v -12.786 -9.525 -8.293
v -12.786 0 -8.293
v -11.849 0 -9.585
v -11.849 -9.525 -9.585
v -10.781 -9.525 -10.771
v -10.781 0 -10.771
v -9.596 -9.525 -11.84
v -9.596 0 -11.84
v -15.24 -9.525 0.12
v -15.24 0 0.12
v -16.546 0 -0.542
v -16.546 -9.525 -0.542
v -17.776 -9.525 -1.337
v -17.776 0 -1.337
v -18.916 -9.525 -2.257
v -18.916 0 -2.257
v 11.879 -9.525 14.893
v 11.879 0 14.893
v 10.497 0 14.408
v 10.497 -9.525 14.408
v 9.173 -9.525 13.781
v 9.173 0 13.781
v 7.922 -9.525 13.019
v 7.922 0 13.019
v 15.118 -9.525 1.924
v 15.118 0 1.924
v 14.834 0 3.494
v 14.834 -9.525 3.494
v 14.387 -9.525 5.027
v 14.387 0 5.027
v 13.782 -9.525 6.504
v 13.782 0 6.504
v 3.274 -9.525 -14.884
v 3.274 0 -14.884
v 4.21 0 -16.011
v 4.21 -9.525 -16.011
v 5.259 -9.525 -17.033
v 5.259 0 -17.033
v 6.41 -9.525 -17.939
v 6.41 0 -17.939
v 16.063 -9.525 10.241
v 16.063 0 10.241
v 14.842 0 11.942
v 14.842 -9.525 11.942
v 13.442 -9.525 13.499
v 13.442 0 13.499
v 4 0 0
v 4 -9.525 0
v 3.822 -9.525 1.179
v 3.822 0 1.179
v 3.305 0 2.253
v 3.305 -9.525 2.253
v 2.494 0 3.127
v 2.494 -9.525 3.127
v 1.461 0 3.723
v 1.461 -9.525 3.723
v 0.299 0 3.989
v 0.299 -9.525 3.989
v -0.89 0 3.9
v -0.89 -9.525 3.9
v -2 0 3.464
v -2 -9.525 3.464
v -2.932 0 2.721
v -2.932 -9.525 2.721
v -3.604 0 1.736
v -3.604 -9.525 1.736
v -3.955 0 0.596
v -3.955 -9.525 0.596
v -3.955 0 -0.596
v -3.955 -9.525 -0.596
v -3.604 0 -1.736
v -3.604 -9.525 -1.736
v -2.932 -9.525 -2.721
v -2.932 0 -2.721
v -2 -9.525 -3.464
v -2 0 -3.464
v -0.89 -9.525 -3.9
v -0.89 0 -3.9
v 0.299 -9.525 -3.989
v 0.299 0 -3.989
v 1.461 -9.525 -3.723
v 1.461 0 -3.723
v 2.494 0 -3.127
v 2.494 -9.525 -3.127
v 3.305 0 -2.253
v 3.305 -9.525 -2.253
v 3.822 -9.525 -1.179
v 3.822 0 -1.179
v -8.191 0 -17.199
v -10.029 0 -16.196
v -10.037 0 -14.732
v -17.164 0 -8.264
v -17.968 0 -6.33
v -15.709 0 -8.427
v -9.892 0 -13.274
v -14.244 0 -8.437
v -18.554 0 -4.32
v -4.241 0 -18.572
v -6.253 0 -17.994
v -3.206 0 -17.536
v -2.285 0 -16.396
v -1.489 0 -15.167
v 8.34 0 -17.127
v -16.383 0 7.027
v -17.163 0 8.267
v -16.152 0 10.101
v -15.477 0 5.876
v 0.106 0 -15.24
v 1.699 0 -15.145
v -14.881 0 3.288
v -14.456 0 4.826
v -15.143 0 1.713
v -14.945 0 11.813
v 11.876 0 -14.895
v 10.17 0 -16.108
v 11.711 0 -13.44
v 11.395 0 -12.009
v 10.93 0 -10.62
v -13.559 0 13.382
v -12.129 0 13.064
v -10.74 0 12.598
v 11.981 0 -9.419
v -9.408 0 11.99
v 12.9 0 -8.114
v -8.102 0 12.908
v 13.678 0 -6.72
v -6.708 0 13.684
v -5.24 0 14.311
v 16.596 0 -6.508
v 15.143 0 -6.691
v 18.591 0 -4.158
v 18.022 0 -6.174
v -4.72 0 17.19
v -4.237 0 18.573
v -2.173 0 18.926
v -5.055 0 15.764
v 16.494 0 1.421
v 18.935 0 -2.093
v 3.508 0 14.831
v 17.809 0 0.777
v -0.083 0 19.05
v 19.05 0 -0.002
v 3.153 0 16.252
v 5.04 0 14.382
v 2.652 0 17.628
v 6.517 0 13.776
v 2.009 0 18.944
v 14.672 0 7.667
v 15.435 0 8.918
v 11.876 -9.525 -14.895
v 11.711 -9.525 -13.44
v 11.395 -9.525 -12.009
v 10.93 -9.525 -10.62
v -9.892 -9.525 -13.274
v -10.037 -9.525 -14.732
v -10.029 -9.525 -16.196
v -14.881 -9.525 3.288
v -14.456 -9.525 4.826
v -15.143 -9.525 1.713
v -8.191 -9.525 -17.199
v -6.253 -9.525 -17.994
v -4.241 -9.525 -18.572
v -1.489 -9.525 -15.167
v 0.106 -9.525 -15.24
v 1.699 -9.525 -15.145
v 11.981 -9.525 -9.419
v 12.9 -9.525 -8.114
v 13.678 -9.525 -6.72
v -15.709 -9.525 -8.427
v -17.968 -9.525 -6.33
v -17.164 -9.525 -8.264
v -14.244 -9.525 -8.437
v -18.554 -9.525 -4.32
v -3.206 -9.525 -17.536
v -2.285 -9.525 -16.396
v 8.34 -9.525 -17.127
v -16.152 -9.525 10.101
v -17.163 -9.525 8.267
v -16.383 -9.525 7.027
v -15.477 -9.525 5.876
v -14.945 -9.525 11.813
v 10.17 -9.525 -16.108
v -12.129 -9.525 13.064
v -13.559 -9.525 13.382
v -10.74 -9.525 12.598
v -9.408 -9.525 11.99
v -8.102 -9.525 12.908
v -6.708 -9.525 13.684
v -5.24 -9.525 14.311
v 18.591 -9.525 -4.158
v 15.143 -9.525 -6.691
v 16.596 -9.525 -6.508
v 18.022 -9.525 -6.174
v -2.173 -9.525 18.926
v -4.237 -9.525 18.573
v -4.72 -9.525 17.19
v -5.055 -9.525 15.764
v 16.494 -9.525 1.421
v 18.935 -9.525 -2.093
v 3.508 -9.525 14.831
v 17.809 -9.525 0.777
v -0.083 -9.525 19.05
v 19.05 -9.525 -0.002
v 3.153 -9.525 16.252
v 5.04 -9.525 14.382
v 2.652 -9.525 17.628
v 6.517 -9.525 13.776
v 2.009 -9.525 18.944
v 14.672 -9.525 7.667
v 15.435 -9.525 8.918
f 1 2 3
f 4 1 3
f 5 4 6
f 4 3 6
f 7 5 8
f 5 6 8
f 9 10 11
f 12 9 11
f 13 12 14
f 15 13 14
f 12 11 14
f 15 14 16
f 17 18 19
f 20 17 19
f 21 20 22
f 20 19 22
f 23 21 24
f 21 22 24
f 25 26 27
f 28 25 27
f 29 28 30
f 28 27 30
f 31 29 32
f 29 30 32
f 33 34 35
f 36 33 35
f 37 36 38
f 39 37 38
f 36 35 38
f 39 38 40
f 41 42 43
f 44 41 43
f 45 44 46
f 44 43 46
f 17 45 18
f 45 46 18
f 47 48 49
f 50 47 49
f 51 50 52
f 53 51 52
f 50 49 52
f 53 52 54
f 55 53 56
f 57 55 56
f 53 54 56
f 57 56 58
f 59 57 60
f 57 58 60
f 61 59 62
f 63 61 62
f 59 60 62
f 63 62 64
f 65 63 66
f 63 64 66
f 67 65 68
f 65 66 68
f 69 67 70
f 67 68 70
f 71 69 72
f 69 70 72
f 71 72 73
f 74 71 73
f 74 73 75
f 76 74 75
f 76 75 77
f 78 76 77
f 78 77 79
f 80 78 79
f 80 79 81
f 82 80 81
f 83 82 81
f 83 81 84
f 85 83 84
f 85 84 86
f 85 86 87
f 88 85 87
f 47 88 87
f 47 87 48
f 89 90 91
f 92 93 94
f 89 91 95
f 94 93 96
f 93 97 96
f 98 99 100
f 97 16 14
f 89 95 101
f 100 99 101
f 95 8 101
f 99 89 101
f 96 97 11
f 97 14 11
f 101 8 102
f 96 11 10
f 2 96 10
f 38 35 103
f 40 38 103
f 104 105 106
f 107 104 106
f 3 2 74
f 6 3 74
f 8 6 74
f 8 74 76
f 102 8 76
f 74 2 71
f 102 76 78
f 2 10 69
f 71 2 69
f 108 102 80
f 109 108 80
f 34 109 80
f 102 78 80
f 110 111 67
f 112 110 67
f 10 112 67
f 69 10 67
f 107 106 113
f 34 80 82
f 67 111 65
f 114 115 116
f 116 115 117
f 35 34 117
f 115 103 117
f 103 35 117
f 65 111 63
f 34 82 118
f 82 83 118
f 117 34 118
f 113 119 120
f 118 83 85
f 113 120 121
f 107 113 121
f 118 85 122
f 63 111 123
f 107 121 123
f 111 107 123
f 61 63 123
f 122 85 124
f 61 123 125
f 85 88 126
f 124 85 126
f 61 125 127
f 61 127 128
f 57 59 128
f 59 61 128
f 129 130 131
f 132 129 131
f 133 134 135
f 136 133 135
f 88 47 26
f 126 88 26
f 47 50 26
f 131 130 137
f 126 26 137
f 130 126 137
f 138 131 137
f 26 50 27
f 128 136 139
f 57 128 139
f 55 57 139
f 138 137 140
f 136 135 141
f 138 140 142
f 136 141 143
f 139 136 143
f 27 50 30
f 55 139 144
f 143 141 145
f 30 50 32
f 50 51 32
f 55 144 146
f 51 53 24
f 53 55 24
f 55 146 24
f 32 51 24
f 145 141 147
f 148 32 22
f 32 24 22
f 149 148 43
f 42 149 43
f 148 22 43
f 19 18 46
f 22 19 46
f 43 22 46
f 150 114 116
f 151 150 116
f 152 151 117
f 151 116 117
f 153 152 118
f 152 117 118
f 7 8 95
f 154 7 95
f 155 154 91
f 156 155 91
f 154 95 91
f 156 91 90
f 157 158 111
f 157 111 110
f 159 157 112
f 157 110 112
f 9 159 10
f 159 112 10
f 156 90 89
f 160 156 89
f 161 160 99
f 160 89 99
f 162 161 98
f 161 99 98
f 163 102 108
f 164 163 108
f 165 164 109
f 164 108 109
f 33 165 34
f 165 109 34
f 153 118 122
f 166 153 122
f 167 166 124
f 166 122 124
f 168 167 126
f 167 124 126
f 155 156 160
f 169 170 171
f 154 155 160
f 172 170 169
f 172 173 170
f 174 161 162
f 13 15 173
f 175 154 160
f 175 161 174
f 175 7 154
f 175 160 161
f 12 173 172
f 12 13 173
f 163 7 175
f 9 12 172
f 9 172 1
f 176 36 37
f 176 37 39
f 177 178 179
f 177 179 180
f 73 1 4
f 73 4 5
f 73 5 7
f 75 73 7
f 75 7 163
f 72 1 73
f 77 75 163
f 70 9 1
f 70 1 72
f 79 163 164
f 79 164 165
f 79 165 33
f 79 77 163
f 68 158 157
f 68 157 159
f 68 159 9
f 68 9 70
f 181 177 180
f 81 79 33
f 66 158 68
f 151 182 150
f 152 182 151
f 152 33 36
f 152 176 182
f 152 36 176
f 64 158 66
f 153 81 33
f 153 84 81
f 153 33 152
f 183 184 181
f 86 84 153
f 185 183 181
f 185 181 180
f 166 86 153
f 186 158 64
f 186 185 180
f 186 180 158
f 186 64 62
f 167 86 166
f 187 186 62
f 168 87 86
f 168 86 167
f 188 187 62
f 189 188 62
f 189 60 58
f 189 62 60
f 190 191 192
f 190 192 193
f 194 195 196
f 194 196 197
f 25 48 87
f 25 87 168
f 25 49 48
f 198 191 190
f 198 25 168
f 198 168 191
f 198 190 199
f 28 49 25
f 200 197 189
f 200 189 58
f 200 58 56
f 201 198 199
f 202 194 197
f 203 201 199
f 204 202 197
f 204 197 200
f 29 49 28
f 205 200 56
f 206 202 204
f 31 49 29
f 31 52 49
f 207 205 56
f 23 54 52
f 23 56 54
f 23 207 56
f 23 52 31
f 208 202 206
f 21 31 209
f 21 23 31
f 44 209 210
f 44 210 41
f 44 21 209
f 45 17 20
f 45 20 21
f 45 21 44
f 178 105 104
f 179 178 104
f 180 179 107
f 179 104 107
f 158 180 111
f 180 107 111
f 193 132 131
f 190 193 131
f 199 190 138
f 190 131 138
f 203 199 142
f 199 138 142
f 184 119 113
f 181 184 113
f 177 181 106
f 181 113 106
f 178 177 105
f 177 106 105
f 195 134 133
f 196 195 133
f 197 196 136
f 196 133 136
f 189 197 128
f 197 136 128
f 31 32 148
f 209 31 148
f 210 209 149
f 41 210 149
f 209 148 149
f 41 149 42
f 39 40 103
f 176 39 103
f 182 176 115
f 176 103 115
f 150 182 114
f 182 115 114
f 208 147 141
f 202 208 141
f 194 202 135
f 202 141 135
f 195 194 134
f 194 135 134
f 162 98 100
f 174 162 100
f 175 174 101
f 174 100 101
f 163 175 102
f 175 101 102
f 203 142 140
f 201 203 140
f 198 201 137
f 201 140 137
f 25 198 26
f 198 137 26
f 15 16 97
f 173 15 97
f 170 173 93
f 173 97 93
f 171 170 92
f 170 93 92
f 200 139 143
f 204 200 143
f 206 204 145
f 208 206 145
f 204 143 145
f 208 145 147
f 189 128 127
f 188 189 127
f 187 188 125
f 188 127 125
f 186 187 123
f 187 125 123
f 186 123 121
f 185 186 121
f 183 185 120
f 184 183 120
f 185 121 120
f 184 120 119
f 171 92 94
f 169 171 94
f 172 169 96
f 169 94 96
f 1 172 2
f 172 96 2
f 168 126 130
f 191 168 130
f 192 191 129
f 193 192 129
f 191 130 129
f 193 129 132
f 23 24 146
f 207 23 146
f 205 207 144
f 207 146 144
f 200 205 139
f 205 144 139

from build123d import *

# Parameters (mm, degrees)
F1_DEPTH = 9.525
F2_COUNT = 7
F3_R     = 15.24
F4_DEPTH = 9.525
F5_R     = 4
F6_DEPTH = 9.526


with BuildPart() as f1:
    # F0 (on Front) → F1 (new body)
    with BuildSketch(Plane.XZ):
        with BuildLine():
            ThreePointArc((-5.2396074411, 14.3109787878), (-0.9038291333, 15.2131749776), (3.5082727862, 14.8306986369))
            ThreePointArc((3.5082727862, 14.8306986369), (2.9205603088, 16.9463674955), (2.0085985954, 18.9438124907))
            ThreePointArc((2.0085985954, 18.9438124907), (-1.1297864166, 19.0164687219), (-4.2374916987, 18.5727263509))
            ThreePointArc((-4.2374916987, 18.5727263509), (-4.9065328108, 16.4813524805), (-5.2396074411, 14.3109787878))
        make_face()
    extrude(amount=F1_DEPTH)


with BuildPart() as f2_1:
    # F2: instance of F1
    add(f1.part.rotate(Axis((0, 0, 0), (0, -1, 0)), 1 * 360 / F2_COUNT))


with BuildPart() as f2_2:
    # F2: instance of F1
    add(f1.part.rotate(Axis((0, 0, 0), (0, -1, 0)), 2 * 360 / F2_COUNT))


with BuildPart() as f2_3:
    # F2: instance of F1
    add(f1.part.rotate(Axis((0, 0, 0), (0, -1, 0)), 3 * 360 / F2_COUNT))


with BuildPart() as f2_4:
    # F2: instance of F1
    add(f1.part.rotate(Axis((0, 0, 0), (0, -1, 0)), 4 * 360 / F2_COUNT))


with BuildPart() as f2_5:
    # F2: instance of F1
    add(f1.part.rotate(Axis((0, 0, 0), (0, -1, 0)), 5 * 360 / F2_COUNT))


with BuildPart() as f2_6:
    # F2: instance of F1
    add(f1.part.rotate(Axis((0, 0, 0), (0, -1, 0)), 6 * 360 / F2_COUNT))


with BuildPart() as f1_1:
    add(f1.part)

    add(f2_1.part)  # F4 merges F2_1

    add(f2_2.part)  # F4 merges F2_2

    add(f2_3.part)  # F4 merges F2_3

    add(f2_4.part)  # F4 merges F2_4

    add(f2_5.part)  # F4 merges F2_5

    add(f2_6.part)  # F4 merges F2_6
    # F3 (on Front) → F4 (join, through all)
    with BuildSketch(Plane.XZ):
        Circle(F3_R)
    extrude(amount=F4_DEPTH)

    # F5 (on face) → F6 (cut, through all)
    with BuildSketch(Plane.XZ.offset(9.525)):
        Circle(F5_R)
    extrude(amount=-F6_DEPTH, mode=Mode.SUBTRACT)


solid = f1_1.part
